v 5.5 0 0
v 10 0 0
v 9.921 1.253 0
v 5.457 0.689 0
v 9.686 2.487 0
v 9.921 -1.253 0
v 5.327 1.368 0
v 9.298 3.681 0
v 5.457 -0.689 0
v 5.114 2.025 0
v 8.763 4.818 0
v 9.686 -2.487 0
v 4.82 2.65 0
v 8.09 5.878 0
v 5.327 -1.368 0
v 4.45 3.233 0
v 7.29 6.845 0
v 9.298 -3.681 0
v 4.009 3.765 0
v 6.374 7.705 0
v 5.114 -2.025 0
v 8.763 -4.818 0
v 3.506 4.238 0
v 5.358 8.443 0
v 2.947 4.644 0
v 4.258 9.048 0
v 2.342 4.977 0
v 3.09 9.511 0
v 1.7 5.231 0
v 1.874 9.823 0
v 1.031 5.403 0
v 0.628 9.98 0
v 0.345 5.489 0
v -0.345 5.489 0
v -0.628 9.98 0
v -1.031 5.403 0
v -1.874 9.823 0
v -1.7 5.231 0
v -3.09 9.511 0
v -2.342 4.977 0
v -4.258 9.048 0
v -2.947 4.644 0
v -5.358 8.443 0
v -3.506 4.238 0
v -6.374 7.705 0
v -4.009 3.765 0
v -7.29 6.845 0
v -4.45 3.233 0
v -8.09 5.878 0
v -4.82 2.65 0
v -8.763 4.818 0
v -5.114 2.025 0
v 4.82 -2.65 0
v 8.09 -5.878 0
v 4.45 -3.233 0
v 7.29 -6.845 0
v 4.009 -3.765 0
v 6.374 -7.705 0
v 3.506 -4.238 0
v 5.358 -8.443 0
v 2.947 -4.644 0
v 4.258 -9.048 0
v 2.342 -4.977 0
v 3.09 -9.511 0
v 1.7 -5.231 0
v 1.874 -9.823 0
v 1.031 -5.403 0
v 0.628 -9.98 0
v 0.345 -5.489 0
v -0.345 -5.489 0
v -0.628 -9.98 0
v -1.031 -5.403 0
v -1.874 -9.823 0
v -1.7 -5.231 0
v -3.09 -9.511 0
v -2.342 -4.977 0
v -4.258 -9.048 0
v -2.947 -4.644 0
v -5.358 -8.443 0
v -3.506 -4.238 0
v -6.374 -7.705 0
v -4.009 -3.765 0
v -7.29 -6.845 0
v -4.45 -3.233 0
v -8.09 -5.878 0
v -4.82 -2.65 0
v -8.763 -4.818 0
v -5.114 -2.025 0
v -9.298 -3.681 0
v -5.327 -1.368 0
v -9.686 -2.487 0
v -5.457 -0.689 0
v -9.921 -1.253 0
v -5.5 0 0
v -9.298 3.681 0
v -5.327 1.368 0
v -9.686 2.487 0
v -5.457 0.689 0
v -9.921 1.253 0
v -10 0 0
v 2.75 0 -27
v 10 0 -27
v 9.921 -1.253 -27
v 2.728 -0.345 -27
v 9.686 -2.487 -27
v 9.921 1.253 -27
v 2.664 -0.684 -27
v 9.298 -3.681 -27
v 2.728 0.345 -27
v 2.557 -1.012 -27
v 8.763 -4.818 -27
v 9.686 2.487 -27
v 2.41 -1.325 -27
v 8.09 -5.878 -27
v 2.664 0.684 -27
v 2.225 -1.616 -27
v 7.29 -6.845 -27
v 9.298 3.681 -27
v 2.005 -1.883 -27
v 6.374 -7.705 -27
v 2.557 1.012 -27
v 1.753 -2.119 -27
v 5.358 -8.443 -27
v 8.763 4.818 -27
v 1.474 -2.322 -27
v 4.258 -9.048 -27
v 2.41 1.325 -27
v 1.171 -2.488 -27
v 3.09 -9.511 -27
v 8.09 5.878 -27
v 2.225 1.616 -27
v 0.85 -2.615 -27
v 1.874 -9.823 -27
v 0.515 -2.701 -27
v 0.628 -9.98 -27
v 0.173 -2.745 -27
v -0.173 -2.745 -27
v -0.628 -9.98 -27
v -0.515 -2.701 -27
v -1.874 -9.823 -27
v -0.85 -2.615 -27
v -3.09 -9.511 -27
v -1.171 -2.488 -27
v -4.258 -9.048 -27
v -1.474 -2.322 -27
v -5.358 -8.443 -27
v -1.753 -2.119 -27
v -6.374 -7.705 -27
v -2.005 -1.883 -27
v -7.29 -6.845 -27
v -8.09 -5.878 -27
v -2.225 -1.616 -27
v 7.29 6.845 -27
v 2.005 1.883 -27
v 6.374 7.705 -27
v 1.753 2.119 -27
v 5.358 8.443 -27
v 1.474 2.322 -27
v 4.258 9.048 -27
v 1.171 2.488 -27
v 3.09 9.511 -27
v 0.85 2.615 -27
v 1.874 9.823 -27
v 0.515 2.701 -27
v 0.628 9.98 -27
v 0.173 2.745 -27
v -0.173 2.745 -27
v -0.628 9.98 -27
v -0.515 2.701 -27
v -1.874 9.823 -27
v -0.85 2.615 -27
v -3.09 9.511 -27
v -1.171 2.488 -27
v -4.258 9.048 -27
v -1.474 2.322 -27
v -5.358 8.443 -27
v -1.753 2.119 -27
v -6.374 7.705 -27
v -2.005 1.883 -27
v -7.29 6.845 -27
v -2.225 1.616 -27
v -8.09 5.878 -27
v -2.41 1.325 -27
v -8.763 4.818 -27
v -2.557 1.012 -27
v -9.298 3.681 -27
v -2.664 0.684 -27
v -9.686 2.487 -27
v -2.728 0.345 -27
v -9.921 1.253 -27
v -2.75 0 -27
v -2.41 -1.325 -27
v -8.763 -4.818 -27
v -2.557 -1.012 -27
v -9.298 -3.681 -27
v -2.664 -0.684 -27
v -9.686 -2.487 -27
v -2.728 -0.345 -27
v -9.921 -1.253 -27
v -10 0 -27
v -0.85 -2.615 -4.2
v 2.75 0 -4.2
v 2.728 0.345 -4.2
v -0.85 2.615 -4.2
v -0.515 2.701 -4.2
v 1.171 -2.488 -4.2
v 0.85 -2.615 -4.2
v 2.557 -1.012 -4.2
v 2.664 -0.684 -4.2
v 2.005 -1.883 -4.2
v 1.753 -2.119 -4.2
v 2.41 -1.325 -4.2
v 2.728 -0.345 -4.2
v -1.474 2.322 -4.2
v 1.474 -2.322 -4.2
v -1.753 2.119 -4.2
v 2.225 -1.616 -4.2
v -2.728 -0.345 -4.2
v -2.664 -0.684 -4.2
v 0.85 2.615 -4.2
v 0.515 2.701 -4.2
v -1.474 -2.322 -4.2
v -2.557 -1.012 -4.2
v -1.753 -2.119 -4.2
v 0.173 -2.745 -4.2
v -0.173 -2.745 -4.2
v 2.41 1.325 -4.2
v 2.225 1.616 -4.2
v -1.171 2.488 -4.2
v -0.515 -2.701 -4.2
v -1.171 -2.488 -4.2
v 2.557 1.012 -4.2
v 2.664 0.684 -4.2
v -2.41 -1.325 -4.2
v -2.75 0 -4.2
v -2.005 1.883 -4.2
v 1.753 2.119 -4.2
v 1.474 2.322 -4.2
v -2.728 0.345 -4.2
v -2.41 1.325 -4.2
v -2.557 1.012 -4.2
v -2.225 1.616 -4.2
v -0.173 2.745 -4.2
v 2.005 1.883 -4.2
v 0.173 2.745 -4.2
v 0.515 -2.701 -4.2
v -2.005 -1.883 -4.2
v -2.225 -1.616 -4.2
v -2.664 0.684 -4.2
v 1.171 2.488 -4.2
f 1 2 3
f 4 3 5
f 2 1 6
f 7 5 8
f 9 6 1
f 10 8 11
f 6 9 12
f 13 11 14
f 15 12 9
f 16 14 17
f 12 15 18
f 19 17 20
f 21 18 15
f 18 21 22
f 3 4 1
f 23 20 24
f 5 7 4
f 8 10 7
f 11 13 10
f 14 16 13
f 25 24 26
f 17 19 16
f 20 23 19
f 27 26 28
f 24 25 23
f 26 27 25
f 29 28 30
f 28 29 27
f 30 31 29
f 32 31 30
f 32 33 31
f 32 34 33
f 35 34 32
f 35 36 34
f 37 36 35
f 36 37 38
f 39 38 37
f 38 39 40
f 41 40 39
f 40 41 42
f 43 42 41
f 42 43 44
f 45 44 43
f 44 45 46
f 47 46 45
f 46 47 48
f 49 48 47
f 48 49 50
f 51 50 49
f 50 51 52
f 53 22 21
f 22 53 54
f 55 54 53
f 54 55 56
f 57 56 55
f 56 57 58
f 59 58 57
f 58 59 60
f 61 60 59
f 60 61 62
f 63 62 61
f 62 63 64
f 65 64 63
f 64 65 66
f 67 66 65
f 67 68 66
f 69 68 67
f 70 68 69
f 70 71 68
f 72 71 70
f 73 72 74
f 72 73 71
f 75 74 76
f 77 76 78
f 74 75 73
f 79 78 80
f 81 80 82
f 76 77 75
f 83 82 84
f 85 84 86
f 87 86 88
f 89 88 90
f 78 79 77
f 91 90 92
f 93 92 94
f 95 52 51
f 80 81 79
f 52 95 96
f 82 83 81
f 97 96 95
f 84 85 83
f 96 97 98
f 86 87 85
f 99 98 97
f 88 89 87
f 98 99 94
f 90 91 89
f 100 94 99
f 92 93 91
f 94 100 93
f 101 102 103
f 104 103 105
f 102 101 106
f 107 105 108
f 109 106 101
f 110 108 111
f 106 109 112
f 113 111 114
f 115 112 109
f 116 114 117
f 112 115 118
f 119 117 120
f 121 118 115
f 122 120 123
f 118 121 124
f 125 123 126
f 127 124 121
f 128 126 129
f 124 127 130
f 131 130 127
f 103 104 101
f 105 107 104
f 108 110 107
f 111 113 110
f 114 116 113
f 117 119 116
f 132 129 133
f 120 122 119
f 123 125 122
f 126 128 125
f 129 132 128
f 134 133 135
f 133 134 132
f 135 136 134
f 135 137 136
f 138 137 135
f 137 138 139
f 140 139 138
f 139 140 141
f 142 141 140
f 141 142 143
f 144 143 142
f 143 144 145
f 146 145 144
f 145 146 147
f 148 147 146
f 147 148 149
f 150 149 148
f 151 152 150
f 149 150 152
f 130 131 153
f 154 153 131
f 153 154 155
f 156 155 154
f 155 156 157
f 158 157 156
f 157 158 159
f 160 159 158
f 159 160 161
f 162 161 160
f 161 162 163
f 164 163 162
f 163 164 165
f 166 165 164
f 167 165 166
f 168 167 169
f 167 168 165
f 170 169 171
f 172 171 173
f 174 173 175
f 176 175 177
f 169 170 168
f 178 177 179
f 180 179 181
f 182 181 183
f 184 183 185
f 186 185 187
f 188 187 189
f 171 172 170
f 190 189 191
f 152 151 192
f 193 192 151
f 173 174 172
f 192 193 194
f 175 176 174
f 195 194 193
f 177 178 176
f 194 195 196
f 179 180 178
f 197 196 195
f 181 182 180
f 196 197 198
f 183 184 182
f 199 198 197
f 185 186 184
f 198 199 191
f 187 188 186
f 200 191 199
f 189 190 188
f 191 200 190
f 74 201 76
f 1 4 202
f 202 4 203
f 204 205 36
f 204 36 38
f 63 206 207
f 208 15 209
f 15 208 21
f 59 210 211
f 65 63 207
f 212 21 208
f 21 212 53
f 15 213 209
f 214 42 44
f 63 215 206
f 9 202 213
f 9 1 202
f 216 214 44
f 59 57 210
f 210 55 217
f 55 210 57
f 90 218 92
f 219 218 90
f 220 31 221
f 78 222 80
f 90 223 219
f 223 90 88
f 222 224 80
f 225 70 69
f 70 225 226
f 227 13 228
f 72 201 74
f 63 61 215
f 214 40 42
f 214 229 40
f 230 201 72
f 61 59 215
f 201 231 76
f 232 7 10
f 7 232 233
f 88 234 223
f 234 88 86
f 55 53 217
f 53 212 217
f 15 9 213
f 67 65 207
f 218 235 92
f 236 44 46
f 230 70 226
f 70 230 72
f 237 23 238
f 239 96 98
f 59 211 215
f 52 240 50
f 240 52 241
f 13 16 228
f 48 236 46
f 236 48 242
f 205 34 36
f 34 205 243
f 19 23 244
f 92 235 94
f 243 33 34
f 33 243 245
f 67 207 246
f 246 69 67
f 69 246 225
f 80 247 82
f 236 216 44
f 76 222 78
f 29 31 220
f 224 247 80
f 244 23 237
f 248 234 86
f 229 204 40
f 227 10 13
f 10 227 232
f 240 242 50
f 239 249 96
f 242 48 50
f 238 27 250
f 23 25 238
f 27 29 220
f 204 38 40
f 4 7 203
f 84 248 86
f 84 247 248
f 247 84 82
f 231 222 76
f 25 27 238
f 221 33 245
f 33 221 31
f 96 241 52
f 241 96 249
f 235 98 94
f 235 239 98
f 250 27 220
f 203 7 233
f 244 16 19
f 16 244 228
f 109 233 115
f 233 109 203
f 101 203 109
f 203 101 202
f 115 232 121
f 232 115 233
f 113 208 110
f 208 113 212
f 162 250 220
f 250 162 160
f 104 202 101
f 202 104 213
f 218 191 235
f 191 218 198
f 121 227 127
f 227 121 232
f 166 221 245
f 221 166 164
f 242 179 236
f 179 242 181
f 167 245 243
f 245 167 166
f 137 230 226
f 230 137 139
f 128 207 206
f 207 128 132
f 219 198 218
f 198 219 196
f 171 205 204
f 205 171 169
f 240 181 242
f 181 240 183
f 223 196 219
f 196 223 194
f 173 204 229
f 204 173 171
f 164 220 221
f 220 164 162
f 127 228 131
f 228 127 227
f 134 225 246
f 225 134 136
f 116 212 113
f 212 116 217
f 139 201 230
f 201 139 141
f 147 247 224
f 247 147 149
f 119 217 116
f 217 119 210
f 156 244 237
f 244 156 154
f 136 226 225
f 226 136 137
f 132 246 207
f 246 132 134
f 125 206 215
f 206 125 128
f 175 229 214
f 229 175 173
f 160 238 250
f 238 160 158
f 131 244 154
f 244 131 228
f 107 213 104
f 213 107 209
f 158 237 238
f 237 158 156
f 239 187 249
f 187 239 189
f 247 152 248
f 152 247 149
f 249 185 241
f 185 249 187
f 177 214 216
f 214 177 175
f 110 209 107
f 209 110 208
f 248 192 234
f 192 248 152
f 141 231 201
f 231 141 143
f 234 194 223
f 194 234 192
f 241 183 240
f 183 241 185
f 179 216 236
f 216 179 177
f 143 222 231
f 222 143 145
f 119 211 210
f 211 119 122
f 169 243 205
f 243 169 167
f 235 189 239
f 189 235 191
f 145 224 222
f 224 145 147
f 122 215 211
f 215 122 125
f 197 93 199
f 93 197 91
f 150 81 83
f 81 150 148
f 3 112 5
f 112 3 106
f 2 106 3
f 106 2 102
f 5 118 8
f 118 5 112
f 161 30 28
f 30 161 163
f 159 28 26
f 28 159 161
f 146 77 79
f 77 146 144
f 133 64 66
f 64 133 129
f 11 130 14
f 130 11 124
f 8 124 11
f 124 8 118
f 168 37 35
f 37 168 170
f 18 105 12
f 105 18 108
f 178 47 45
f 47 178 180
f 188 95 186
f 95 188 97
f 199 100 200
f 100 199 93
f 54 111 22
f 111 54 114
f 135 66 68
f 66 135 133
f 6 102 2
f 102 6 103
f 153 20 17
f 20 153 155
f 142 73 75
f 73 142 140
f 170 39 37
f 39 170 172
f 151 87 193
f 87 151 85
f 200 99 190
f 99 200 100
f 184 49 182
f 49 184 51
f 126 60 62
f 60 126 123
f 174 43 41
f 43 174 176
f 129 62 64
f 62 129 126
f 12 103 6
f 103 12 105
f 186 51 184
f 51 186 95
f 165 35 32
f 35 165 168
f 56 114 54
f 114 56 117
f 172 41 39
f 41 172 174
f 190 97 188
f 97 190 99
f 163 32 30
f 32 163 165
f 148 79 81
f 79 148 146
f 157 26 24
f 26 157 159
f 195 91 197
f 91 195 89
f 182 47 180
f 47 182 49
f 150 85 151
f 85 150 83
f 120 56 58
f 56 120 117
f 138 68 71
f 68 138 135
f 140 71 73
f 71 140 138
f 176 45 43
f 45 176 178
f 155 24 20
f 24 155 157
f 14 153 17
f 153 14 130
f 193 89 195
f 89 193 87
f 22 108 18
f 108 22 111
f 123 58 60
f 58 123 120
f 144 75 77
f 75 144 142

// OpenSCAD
$fn = 50;


difference() {
	union() {
		translate(v = [0, 0, -27.0000000000]) {
			cylinder(h = 27, r = 10.0000000000);
		}
		cylinder(h = 0, r = 13.0000000000);
	}
	union() {
		translate(v = [0, 0, 0]) {
			rotate(a = [0, 0, 0]) {
				difference() {
					union() {
						#translate(v = [0, 0, -27.0000000000]) {
							cylinder(h = 27, r = 2.2500000000);
						}
						#translate(v = [0, 0, -4.2000000000]) {
							cylinder(h = 4.2000000000, r = 10.0000000000, r1 = 2.7500000000, r2 = 5.5000000000);
						}
						#translate(v = [0, 0, -27.0000000000]) {
							cylinder(h = 27, r = 2.7500000000);
						}
						#translate(v = [0, 0, -27.0000000000]) {
							cylinder(h = 27, r = 2.2500000000);
						}
					}
					union();
				}
			}
		}
	}
}
